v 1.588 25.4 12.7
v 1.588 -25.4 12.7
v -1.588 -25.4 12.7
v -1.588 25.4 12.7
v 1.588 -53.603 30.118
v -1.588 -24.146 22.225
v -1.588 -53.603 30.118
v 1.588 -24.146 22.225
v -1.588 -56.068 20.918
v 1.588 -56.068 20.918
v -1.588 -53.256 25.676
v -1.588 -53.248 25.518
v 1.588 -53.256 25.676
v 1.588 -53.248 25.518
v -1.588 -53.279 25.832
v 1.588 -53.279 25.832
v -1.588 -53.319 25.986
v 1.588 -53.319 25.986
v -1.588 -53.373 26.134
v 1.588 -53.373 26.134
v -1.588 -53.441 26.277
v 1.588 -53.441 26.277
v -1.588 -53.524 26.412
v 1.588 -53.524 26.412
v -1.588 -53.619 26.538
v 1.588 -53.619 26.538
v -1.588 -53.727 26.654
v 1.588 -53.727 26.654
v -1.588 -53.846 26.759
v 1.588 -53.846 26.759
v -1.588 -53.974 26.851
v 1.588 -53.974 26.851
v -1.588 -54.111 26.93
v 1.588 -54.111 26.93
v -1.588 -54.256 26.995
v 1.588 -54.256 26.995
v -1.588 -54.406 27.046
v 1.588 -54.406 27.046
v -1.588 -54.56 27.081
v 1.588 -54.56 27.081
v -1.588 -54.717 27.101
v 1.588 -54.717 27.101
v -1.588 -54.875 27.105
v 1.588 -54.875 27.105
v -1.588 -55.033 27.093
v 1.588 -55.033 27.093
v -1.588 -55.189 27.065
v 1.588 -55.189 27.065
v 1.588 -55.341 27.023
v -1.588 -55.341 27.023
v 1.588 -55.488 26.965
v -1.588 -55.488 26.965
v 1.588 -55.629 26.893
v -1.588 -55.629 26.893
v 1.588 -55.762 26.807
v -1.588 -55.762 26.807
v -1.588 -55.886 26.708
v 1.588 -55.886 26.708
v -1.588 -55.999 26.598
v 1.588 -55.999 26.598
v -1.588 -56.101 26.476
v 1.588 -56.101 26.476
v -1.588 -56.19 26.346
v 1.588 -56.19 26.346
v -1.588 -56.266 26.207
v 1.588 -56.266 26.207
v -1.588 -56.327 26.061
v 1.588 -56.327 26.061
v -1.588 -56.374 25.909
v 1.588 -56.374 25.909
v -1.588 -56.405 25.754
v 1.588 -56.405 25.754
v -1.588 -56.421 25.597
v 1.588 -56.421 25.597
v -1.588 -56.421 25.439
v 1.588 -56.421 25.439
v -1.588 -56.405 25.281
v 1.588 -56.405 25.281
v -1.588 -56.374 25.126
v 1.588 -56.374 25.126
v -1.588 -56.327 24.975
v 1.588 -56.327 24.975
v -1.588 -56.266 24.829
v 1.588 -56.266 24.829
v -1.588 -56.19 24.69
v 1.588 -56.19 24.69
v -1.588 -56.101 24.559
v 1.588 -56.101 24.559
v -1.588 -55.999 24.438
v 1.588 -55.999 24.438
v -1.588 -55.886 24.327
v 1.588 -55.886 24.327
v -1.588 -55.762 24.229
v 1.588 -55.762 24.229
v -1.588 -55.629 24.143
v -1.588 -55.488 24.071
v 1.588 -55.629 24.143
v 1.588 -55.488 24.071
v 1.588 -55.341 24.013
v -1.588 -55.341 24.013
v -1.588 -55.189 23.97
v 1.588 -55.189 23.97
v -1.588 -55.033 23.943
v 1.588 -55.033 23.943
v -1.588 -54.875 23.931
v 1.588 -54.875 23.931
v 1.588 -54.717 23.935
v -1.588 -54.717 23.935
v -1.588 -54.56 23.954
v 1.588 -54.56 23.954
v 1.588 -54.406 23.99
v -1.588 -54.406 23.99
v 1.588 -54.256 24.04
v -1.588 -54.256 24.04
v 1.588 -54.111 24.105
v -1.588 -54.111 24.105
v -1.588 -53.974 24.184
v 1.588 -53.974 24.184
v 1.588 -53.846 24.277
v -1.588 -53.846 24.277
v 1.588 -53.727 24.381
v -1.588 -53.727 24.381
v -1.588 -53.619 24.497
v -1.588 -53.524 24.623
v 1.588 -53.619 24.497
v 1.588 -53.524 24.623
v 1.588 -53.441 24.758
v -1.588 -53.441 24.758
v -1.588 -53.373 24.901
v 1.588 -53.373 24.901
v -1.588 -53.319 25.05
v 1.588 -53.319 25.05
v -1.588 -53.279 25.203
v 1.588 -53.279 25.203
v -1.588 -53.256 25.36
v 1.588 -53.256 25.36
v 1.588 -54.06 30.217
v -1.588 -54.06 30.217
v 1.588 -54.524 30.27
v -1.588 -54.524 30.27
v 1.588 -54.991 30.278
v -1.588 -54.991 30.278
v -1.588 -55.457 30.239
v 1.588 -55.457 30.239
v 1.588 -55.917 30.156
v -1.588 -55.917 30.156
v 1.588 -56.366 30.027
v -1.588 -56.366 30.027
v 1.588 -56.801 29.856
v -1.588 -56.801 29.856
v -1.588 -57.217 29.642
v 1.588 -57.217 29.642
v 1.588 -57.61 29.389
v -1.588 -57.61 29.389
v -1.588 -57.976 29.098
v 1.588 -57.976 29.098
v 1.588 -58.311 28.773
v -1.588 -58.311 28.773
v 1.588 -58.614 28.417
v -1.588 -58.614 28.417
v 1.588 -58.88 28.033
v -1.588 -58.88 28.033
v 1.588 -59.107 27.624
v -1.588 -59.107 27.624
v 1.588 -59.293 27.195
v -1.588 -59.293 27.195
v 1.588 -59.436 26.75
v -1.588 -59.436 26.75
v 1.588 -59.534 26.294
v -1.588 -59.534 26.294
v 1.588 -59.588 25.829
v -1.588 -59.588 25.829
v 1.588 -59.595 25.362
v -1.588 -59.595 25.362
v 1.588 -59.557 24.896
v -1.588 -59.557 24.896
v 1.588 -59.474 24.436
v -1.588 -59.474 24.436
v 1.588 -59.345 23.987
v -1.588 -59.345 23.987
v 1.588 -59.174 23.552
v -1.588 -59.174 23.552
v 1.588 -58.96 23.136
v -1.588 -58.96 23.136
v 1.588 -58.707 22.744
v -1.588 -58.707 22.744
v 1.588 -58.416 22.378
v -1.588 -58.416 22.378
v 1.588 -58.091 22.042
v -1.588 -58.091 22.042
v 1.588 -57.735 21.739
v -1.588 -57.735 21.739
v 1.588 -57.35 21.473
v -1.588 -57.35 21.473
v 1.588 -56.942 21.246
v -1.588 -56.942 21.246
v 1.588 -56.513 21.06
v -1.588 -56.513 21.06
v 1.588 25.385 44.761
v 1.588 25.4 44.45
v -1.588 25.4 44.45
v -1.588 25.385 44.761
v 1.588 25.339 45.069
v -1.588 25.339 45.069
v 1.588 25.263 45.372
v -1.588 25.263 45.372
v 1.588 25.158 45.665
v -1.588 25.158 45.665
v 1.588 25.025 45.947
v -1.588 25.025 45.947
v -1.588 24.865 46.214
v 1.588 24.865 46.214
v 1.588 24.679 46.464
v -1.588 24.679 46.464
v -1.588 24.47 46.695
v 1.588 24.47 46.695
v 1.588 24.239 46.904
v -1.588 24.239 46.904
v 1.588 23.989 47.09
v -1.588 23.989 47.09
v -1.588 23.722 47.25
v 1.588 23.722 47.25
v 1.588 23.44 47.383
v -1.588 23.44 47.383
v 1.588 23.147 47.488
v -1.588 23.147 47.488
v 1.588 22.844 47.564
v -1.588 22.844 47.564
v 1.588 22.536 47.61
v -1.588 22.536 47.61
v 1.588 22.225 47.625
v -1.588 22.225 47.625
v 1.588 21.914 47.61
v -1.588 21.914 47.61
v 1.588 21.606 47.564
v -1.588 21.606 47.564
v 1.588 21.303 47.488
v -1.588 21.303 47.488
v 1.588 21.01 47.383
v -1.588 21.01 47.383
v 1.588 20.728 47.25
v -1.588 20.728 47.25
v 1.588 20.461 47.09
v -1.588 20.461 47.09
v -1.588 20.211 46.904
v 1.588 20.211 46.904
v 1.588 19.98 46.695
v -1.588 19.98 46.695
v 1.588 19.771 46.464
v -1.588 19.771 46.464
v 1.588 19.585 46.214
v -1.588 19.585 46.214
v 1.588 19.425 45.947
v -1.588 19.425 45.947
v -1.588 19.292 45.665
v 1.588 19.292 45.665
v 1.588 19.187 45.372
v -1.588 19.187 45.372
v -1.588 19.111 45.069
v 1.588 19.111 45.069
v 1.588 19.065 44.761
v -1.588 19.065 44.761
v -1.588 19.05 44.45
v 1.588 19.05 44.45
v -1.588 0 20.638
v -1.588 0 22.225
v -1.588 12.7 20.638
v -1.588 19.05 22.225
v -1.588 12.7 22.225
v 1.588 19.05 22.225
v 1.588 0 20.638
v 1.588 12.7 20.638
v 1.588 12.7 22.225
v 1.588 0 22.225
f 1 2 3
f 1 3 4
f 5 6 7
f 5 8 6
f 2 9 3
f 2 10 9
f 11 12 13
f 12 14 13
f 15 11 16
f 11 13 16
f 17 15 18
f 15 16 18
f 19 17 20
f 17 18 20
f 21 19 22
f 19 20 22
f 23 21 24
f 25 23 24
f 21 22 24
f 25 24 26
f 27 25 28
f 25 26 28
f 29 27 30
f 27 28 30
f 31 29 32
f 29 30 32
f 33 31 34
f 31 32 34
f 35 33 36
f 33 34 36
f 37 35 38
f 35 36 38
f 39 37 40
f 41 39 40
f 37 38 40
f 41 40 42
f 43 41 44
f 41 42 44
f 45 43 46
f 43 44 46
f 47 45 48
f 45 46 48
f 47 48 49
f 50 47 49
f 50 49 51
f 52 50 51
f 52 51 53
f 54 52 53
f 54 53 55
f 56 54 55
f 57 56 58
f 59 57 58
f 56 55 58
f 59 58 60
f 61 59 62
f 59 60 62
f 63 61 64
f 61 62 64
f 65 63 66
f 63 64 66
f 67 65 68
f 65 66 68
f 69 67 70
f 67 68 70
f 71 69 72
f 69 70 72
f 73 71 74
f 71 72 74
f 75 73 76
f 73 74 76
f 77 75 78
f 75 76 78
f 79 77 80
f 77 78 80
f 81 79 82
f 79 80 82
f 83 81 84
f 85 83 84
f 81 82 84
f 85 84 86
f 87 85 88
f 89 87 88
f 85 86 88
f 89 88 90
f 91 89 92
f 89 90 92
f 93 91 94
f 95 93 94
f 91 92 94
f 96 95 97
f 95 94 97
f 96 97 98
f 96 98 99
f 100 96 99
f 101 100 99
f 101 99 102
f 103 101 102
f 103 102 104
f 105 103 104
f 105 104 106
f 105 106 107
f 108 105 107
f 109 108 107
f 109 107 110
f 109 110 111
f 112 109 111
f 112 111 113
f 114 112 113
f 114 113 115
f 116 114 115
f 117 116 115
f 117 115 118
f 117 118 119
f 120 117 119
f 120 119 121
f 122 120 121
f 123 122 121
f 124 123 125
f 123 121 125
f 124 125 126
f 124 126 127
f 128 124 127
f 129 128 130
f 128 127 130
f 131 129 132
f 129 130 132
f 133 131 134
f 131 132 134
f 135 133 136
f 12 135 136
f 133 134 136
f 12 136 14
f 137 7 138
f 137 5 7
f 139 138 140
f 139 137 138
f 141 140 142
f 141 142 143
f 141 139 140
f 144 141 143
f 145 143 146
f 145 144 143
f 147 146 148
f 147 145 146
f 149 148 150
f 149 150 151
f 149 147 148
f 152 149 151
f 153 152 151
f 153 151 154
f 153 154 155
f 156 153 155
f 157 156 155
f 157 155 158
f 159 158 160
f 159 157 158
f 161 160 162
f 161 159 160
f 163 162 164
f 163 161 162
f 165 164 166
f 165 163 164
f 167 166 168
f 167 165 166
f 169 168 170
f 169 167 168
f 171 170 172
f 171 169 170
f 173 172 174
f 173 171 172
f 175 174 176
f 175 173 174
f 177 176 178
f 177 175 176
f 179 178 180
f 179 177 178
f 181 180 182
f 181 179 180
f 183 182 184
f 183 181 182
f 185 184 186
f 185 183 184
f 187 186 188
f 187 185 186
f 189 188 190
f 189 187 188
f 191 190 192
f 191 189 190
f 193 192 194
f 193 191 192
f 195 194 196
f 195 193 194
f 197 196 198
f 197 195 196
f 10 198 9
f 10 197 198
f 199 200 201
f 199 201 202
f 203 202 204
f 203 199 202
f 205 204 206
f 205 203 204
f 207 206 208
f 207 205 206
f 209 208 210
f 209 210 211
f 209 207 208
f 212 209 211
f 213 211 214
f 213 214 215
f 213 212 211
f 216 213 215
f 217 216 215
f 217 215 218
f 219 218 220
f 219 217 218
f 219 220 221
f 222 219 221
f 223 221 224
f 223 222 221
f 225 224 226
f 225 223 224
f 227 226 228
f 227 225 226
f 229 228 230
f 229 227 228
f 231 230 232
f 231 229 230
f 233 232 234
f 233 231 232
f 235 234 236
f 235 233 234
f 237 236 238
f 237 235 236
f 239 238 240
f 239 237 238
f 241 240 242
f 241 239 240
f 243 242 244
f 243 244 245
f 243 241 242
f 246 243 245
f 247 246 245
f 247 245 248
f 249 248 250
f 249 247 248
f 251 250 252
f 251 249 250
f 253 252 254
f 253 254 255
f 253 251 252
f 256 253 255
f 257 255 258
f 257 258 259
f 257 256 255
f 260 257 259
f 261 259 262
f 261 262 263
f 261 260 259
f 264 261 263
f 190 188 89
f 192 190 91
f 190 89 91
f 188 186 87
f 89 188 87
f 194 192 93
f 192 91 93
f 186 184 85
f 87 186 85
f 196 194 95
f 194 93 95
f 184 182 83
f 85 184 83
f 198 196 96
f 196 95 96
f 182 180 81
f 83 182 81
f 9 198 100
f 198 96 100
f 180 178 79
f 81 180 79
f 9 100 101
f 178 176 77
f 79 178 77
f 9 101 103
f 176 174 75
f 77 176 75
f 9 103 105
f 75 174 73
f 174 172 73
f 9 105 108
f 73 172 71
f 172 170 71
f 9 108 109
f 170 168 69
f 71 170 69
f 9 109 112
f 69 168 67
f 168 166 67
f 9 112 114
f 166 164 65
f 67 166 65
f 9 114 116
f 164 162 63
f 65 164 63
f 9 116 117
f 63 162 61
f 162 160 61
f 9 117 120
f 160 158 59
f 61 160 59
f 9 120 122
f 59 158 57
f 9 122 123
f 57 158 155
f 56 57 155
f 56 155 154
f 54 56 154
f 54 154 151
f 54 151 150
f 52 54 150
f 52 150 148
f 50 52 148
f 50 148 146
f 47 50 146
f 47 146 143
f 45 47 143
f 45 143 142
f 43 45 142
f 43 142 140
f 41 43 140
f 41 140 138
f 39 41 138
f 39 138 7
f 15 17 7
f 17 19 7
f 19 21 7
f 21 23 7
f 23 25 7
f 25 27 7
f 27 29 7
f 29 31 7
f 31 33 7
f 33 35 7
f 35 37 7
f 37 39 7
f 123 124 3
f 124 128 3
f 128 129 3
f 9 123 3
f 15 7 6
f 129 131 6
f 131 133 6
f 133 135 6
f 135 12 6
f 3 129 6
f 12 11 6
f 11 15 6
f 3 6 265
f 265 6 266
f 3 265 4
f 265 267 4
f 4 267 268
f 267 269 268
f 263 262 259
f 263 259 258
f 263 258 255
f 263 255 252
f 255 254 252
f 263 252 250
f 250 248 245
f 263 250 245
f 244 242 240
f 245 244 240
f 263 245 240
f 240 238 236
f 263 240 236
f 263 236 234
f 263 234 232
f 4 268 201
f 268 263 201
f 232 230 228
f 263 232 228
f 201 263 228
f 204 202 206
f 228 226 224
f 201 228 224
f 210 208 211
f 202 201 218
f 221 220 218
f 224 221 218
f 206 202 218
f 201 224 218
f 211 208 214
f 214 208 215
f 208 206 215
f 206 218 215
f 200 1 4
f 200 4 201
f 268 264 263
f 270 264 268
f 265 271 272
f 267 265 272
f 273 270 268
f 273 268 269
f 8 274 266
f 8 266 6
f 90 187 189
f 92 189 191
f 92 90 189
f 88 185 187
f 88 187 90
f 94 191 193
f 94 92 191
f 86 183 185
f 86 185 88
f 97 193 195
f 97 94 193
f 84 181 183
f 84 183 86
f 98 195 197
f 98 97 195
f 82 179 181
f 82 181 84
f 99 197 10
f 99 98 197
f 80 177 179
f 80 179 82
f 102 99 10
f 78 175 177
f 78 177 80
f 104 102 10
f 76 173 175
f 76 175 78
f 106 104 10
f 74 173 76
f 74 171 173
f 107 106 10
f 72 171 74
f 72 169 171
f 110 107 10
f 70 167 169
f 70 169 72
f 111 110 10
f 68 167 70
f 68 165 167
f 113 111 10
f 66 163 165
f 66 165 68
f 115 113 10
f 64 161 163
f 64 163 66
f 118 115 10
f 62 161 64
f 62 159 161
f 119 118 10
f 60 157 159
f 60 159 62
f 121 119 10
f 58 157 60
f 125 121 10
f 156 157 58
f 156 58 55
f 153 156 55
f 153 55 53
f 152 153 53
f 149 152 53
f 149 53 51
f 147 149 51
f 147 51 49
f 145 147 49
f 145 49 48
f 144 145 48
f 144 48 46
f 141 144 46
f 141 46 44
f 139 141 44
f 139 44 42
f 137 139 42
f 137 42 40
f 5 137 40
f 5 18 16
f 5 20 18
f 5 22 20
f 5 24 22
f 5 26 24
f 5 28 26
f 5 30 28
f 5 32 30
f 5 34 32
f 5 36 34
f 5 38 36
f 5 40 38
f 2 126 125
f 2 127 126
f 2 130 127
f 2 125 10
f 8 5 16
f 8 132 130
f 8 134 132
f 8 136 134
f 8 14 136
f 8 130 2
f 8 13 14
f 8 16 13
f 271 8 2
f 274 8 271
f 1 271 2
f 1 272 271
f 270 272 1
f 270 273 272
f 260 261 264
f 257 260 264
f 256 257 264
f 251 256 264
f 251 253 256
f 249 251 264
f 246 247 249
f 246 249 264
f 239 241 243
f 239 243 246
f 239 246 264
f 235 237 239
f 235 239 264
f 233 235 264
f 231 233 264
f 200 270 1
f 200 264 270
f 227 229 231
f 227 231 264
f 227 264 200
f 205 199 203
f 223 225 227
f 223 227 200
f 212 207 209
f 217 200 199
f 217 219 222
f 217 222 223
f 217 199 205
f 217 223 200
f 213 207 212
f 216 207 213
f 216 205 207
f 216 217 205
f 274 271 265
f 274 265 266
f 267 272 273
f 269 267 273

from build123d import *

# Parameters (mm, degrees)
F3_DEPTH = 1.5875
F2_W     = 12.7
F2_H     = 3.175
F4_DEPTH = 12.7
F1_R     = 1.5875
F5_DEPTH = 12.7


with BuildPart() as f3:
    # F0 (on Right) → F3 (new body, symmetric)
    with BuildSketch(Plane.YZ):
        with BuildLine():
            Line((-56.068145, 20.917505), (-25.4, 12.7))
            Line((-25.4, 12.7), (25.4, 12.7))
            Line((25.4, 12.7), (25.4, 44.45))
            ThreePointArc((25.4, 44.45), (22.225, 47.625), (19.05, 44.45))
            Line((19.05, 44.45), (19.05, 22.225))
            Line((19.05, 22.225), (-24.14601, 22.225))
            Line((-24.14601, 22.225), (-53.602894, 30.117948))
            ThreePointArc((-53.602894, 30.117948), (-59.435741, 26.750352), (-56.068145, 20.917505))
        make_face()
    extrude(amount=F3_DEPTH, both=True)

    # F2 (on Right) → F4 (cut, symmetric)
    with BuildSketch(Plane.YZ):
        with Locations((6.35, 22.225)):
            Rectangle(F2_W, F2_H)
    extrude(amount=F4_DEPTH, both=True, mode=Mode.SUBTRACT)

    # F1 (on Right) → F5 (cut, symmetric)
    with BuildSketch(Plane.YZ):
        with Locations((-54.835519, 25.517726)):
            Circle(F1_R)
    extrude(amount=F5_DEPTH, both=True, mode=Mode.SUBTRACT)


solid = f3.part
